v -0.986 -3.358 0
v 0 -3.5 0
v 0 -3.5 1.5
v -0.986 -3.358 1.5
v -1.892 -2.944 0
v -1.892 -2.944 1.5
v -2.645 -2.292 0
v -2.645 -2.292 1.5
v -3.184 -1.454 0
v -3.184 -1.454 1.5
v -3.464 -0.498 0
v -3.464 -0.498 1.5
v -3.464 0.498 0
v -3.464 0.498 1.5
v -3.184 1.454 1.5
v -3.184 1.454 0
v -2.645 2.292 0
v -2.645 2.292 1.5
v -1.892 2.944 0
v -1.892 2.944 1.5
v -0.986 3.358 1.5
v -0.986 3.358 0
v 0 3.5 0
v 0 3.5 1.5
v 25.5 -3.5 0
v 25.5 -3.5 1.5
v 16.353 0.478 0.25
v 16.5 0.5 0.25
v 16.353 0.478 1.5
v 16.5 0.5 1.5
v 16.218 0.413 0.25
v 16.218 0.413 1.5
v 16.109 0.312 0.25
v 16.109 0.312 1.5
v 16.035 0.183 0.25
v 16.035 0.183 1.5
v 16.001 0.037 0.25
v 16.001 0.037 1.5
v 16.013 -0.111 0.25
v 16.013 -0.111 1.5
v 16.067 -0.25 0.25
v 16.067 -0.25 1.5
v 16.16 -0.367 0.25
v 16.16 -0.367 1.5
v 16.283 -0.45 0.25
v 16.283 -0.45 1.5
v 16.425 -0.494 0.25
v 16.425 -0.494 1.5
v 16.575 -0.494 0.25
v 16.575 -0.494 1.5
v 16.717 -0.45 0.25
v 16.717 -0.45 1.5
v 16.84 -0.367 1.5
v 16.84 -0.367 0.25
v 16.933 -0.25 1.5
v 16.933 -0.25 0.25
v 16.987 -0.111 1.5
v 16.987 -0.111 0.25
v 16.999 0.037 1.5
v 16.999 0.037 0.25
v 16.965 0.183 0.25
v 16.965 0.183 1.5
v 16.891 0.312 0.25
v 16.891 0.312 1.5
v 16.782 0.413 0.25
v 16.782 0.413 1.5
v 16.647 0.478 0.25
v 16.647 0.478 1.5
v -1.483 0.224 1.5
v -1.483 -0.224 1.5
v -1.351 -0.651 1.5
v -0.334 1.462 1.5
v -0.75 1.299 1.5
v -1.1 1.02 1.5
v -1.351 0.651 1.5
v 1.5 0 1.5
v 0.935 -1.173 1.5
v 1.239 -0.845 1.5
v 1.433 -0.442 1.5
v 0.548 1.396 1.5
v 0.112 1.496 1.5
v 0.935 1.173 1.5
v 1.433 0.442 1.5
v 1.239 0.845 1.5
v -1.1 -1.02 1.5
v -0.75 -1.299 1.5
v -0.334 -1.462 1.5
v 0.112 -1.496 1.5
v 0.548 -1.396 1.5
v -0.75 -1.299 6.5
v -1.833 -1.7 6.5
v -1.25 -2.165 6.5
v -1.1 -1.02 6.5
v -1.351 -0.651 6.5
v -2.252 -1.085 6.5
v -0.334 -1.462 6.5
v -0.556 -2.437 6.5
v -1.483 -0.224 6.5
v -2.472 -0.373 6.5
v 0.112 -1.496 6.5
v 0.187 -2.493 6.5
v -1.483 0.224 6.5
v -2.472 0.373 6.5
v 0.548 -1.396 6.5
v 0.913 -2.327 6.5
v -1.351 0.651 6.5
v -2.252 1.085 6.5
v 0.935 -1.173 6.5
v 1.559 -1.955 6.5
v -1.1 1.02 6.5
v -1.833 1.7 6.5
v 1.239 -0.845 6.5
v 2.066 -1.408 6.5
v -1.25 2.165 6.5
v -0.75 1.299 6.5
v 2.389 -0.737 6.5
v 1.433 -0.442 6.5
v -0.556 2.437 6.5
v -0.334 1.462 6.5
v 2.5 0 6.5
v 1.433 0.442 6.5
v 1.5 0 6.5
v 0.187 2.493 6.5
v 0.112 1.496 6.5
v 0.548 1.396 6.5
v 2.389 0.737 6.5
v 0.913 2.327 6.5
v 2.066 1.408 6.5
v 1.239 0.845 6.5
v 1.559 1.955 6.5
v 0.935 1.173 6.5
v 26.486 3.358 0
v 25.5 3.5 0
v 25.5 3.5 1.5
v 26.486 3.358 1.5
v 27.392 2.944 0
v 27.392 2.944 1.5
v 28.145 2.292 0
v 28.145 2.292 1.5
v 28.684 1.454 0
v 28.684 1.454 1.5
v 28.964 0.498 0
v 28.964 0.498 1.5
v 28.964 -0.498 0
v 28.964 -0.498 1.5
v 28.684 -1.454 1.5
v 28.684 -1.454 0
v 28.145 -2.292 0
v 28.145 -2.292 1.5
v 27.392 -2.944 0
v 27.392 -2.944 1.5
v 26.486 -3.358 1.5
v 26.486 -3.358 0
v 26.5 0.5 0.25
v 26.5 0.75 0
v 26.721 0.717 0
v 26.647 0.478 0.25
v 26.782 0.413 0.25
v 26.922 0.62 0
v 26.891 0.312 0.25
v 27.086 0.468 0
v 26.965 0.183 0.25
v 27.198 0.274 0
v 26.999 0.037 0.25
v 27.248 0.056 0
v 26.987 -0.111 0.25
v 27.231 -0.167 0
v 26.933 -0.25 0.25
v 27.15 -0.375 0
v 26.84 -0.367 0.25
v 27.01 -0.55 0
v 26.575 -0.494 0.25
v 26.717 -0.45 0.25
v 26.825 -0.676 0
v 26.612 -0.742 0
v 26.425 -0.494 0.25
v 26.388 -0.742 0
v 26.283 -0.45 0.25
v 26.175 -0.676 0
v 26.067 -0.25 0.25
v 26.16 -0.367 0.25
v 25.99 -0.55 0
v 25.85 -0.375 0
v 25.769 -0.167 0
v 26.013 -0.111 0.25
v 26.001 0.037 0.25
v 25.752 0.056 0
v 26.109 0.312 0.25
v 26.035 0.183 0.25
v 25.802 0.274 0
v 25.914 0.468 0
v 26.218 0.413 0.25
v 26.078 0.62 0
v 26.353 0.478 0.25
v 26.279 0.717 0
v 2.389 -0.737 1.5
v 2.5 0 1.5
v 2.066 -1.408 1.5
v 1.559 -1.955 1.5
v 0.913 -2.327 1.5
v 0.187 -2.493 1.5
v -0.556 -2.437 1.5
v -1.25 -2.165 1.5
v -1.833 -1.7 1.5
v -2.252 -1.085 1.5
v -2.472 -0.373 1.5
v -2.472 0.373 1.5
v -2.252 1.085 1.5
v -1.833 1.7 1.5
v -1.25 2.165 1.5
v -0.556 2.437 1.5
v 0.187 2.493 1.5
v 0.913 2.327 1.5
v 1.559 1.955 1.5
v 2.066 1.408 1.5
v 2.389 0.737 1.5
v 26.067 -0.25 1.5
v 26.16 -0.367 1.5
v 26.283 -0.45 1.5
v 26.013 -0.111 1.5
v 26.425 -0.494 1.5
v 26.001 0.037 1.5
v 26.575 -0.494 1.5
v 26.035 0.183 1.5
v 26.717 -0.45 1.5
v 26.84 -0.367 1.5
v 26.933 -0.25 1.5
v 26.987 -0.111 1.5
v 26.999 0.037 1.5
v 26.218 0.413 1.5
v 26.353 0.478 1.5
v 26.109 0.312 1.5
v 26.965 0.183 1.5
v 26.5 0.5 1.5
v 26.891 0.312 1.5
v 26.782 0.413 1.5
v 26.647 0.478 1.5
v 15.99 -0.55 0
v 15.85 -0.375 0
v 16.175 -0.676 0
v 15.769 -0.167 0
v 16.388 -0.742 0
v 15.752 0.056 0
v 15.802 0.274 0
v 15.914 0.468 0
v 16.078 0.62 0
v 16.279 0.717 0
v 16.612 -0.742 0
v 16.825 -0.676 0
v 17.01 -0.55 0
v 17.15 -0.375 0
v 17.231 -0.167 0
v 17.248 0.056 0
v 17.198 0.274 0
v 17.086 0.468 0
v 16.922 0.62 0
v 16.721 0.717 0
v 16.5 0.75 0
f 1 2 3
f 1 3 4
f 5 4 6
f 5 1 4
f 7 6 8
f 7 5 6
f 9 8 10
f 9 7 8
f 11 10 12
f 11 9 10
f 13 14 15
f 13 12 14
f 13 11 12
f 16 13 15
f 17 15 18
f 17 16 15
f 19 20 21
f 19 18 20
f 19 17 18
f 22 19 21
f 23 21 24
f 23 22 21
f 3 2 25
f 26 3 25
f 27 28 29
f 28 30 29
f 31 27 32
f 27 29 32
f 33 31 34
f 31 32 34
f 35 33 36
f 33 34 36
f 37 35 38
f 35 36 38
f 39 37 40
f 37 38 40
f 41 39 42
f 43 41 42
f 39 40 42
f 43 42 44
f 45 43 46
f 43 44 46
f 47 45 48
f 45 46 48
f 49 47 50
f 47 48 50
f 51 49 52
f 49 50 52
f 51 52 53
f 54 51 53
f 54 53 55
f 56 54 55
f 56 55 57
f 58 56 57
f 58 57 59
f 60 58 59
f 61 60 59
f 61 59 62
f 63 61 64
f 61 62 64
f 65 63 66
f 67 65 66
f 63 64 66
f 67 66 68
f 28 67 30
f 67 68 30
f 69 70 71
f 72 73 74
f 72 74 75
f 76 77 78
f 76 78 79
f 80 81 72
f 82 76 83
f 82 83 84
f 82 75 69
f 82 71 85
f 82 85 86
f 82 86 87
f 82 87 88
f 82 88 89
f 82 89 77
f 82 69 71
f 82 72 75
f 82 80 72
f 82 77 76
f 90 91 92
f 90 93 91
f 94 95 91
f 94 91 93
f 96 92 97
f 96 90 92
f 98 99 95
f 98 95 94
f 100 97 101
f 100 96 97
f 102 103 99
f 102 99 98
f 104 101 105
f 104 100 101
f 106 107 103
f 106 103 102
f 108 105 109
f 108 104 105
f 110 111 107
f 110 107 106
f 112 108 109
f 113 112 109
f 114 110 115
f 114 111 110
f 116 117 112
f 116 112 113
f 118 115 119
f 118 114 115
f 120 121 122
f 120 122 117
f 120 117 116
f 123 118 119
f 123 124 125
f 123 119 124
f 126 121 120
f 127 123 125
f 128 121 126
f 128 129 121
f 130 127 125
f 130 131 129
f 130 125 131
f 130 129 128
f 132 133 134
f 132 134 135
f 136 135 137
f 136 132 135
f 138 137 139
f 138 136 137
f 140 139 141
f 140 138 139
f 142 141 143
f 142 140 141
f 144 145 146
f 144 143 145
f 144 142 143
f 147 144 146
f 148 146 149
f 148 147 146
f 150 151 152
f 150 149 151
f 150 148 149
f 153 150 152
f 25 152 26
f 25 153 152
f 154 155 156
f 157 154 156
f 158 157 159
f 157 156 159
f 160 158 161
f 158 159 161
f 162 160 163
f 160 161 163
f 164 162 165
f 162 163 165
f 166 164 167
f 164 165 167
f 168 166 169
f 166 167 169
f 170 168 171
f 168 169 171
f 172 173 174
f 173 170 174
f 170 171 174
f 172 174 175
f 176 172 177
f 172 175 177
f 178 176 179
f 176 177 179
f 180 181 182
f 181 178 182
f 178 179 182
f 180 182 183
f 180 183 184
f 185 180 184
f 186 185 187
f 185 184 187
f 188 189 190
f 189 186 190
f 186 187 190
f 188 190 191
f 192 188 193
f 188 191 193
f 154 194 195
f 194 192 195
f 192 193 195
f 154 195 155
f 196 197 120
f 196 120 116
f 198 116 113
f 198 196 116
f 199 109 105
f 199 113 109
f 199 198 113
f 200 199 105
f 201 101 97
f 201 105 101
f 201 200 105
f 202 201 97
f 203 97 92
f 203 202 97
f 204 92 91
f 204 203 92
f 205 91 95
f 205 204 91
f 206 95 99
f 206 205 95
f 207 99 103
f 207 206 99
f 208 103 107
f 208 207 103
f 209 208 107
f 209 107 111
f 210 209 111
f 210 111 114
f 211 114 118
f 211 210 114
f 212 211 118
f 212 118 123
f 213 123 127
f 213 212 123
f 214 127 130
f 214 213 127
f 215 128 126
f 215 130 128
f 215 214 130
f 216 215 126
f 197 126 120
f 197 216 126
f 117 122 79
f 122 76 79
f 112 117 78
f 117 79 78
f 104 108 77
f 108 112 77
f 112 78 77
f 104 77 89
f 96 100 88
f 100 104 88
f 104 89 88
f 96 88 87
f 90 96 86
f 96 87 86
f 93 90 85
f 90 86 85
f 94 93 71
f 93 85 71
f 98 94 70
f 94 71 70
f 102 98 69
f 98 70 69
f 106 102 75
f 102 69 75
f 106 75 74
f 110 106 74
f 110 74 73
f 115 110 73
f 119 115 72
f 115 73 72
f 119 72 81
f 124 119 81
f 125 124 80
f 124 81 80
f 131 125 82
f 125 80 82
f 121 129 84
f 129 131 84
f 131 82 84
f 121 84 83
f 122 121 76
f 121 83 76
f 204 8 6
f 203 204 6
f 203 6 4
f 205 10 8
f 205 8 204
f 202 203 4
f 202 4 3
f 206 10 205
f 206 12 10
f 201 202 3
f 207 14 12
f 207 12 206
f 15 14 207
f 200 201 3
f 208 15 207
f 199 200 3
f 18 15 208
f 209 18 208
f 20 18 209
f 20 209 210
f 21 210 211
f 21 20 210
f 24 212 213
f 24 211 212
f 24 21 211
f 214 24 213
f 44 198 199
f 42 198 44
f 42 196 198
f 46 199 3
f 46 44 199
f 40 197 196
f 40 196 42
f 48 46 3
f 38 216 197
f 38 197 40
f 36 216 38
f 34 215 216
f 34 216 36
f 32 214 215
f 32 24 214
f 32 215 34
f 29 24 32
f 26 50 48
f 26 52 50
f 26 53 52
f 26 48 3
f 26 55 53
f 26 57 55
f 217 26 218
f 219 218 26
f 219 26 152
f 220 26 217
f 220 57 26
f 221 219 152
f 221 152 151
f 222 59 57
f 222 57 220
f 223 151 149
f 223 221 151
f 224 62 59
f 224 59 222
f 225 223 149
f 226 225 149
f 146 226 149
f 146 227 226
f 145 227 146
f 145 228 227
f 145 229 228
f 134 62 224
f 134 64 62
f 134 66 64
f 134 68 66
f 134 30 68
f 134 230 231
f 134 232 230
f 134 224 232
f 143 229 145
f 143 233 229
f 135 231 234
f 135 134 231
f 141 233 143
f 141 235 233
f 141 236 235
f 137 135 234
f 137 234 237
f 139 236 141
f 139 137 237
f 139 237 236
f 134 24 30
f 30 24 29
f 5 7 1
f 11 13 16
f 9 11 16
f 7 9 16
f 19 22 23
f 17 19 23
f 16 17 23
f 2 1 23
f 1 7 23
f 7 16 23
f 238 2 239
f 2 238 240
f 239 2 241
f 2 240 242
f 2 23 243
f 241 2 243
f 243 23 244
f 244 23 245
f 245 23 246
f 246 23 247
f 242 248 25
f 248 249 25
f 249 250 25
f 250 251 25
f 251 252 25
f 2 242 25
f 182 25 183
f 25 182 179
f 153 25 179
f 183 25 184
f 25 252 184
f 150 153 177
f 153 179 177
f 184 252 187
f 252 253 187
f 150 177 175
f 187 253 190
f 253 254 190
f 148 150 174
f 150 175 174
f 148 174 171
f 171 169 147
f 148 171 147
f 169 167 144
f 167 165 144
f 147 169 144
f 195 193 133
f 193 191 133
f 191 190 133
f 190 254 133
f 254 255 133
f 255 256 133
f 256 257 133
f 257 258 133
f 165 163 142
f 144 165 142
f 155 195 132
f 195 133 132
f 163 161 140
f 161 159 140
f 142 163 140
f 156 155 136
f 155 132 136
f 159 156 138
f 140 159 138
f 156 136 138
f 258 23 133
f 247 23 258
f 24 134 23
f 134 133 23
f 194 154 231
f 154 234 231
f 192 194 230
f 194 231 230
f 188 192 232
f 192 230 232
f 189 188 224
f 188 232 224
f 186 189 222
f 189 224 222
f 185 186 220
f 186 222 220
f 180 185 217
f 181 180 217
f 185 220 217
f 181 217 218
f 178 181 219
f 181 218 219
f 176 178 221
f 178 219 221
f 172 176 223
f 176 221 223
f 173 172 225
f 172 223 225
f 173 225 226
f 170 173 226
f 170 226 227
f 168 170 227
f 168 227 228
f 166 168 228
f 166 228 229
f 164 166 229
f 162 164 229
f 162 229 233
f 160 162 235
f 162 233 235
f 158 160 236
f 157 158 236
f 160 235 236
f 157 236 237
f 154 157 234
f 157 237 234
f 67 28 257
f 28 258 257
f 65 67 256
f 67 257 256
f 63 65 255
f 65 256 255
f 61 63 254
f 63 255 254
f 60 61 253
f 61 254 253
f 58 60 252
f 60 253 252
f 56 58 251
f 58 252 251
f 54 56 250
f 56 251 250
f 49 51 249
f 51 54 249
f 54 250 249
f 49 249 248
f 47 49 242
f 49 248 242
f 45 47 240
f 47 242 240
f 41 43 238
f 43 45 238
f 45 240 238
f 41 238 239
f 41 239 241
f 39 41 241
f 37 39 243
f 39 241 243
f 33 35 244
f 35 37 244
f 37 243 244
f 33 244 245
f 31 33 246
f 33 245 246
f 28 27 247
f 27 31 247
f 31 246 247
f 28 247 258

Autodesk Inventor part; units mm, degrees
ref_plane "YZ Plane" through (0, 0, 0) normal (1, 0, 0) x (0, 1, 0)
ref_plane "XZ Plane" through (0, 0, 0) normal (0, 1, 0) x (-1, 0, 0)
ref_plane "XY Plane" through (0, 0, 0) normal (0, 0, 1) x (1, 0, 0)
sketch "Эскиз1" plane through (0, 0, 0) normal (0, 0, 1) x (1, 0, 0)
  line L0 (0, 0) -> (25.5, 0) construction
  line L1 (0, -3.5) -> (25.5, -3.5)
  line L2 (25.5, 3.5) -> (0, 3.5)
  arc A0 (0, 3.5) -> (0, -3.5) centre (0, 0) ccw
  arc A1 (25.5, -3.5) -> (25.5, 3.5) centre (25.5, 0) ccw
  point P0 (12.75, 0)
  dimension "d0" = 25.5
  dimension "d1" = 7
extrude "Выдавливание1" add sketch "Эскиз1" along normal blind 1.5
sketch "Эскиз2" plane through (0, 0, 1.5) normal (0, 0, 1) x (1, 0, 0)
  circle A0 centre (0, 0) radius 2.5
  circle A1 centre (0, 0) radius 1.5
  dimension "d4" = 5
  dimension "d5" = 1
extrude "Выдавливание2" add sketch "Эскиз2" along normal blind 5
sketch "Эскиз6" plane through (0, 0, 0) normal (0, 0, 1) x (1, 0, 0)
  line L0 (-10, 0) -> (35.5, 0) construction
  arc A0 (25.5, -3.5) -> (25.5, 3.5) centre (25.5, 0) ccw construction
  circle A1 centre (26.5, 0) radius 0.5
  circle A2 centre (16.5, 0) radius 0.5
  point P0 (0, 0)
  point P1 (29, 0)
  point P2 (29, 0)
  dimension "d22" = 1
  dimension "d23" = 2.5
  dimension "d25" = 10
hole "Отверстие1" at (26.5, 0, 0) at (16.5, 0, 0) direction (0, 0, 1) diameter 1 end through all countersink diameter 1.5 countersink angle 90
properties part number "элемент-2"
